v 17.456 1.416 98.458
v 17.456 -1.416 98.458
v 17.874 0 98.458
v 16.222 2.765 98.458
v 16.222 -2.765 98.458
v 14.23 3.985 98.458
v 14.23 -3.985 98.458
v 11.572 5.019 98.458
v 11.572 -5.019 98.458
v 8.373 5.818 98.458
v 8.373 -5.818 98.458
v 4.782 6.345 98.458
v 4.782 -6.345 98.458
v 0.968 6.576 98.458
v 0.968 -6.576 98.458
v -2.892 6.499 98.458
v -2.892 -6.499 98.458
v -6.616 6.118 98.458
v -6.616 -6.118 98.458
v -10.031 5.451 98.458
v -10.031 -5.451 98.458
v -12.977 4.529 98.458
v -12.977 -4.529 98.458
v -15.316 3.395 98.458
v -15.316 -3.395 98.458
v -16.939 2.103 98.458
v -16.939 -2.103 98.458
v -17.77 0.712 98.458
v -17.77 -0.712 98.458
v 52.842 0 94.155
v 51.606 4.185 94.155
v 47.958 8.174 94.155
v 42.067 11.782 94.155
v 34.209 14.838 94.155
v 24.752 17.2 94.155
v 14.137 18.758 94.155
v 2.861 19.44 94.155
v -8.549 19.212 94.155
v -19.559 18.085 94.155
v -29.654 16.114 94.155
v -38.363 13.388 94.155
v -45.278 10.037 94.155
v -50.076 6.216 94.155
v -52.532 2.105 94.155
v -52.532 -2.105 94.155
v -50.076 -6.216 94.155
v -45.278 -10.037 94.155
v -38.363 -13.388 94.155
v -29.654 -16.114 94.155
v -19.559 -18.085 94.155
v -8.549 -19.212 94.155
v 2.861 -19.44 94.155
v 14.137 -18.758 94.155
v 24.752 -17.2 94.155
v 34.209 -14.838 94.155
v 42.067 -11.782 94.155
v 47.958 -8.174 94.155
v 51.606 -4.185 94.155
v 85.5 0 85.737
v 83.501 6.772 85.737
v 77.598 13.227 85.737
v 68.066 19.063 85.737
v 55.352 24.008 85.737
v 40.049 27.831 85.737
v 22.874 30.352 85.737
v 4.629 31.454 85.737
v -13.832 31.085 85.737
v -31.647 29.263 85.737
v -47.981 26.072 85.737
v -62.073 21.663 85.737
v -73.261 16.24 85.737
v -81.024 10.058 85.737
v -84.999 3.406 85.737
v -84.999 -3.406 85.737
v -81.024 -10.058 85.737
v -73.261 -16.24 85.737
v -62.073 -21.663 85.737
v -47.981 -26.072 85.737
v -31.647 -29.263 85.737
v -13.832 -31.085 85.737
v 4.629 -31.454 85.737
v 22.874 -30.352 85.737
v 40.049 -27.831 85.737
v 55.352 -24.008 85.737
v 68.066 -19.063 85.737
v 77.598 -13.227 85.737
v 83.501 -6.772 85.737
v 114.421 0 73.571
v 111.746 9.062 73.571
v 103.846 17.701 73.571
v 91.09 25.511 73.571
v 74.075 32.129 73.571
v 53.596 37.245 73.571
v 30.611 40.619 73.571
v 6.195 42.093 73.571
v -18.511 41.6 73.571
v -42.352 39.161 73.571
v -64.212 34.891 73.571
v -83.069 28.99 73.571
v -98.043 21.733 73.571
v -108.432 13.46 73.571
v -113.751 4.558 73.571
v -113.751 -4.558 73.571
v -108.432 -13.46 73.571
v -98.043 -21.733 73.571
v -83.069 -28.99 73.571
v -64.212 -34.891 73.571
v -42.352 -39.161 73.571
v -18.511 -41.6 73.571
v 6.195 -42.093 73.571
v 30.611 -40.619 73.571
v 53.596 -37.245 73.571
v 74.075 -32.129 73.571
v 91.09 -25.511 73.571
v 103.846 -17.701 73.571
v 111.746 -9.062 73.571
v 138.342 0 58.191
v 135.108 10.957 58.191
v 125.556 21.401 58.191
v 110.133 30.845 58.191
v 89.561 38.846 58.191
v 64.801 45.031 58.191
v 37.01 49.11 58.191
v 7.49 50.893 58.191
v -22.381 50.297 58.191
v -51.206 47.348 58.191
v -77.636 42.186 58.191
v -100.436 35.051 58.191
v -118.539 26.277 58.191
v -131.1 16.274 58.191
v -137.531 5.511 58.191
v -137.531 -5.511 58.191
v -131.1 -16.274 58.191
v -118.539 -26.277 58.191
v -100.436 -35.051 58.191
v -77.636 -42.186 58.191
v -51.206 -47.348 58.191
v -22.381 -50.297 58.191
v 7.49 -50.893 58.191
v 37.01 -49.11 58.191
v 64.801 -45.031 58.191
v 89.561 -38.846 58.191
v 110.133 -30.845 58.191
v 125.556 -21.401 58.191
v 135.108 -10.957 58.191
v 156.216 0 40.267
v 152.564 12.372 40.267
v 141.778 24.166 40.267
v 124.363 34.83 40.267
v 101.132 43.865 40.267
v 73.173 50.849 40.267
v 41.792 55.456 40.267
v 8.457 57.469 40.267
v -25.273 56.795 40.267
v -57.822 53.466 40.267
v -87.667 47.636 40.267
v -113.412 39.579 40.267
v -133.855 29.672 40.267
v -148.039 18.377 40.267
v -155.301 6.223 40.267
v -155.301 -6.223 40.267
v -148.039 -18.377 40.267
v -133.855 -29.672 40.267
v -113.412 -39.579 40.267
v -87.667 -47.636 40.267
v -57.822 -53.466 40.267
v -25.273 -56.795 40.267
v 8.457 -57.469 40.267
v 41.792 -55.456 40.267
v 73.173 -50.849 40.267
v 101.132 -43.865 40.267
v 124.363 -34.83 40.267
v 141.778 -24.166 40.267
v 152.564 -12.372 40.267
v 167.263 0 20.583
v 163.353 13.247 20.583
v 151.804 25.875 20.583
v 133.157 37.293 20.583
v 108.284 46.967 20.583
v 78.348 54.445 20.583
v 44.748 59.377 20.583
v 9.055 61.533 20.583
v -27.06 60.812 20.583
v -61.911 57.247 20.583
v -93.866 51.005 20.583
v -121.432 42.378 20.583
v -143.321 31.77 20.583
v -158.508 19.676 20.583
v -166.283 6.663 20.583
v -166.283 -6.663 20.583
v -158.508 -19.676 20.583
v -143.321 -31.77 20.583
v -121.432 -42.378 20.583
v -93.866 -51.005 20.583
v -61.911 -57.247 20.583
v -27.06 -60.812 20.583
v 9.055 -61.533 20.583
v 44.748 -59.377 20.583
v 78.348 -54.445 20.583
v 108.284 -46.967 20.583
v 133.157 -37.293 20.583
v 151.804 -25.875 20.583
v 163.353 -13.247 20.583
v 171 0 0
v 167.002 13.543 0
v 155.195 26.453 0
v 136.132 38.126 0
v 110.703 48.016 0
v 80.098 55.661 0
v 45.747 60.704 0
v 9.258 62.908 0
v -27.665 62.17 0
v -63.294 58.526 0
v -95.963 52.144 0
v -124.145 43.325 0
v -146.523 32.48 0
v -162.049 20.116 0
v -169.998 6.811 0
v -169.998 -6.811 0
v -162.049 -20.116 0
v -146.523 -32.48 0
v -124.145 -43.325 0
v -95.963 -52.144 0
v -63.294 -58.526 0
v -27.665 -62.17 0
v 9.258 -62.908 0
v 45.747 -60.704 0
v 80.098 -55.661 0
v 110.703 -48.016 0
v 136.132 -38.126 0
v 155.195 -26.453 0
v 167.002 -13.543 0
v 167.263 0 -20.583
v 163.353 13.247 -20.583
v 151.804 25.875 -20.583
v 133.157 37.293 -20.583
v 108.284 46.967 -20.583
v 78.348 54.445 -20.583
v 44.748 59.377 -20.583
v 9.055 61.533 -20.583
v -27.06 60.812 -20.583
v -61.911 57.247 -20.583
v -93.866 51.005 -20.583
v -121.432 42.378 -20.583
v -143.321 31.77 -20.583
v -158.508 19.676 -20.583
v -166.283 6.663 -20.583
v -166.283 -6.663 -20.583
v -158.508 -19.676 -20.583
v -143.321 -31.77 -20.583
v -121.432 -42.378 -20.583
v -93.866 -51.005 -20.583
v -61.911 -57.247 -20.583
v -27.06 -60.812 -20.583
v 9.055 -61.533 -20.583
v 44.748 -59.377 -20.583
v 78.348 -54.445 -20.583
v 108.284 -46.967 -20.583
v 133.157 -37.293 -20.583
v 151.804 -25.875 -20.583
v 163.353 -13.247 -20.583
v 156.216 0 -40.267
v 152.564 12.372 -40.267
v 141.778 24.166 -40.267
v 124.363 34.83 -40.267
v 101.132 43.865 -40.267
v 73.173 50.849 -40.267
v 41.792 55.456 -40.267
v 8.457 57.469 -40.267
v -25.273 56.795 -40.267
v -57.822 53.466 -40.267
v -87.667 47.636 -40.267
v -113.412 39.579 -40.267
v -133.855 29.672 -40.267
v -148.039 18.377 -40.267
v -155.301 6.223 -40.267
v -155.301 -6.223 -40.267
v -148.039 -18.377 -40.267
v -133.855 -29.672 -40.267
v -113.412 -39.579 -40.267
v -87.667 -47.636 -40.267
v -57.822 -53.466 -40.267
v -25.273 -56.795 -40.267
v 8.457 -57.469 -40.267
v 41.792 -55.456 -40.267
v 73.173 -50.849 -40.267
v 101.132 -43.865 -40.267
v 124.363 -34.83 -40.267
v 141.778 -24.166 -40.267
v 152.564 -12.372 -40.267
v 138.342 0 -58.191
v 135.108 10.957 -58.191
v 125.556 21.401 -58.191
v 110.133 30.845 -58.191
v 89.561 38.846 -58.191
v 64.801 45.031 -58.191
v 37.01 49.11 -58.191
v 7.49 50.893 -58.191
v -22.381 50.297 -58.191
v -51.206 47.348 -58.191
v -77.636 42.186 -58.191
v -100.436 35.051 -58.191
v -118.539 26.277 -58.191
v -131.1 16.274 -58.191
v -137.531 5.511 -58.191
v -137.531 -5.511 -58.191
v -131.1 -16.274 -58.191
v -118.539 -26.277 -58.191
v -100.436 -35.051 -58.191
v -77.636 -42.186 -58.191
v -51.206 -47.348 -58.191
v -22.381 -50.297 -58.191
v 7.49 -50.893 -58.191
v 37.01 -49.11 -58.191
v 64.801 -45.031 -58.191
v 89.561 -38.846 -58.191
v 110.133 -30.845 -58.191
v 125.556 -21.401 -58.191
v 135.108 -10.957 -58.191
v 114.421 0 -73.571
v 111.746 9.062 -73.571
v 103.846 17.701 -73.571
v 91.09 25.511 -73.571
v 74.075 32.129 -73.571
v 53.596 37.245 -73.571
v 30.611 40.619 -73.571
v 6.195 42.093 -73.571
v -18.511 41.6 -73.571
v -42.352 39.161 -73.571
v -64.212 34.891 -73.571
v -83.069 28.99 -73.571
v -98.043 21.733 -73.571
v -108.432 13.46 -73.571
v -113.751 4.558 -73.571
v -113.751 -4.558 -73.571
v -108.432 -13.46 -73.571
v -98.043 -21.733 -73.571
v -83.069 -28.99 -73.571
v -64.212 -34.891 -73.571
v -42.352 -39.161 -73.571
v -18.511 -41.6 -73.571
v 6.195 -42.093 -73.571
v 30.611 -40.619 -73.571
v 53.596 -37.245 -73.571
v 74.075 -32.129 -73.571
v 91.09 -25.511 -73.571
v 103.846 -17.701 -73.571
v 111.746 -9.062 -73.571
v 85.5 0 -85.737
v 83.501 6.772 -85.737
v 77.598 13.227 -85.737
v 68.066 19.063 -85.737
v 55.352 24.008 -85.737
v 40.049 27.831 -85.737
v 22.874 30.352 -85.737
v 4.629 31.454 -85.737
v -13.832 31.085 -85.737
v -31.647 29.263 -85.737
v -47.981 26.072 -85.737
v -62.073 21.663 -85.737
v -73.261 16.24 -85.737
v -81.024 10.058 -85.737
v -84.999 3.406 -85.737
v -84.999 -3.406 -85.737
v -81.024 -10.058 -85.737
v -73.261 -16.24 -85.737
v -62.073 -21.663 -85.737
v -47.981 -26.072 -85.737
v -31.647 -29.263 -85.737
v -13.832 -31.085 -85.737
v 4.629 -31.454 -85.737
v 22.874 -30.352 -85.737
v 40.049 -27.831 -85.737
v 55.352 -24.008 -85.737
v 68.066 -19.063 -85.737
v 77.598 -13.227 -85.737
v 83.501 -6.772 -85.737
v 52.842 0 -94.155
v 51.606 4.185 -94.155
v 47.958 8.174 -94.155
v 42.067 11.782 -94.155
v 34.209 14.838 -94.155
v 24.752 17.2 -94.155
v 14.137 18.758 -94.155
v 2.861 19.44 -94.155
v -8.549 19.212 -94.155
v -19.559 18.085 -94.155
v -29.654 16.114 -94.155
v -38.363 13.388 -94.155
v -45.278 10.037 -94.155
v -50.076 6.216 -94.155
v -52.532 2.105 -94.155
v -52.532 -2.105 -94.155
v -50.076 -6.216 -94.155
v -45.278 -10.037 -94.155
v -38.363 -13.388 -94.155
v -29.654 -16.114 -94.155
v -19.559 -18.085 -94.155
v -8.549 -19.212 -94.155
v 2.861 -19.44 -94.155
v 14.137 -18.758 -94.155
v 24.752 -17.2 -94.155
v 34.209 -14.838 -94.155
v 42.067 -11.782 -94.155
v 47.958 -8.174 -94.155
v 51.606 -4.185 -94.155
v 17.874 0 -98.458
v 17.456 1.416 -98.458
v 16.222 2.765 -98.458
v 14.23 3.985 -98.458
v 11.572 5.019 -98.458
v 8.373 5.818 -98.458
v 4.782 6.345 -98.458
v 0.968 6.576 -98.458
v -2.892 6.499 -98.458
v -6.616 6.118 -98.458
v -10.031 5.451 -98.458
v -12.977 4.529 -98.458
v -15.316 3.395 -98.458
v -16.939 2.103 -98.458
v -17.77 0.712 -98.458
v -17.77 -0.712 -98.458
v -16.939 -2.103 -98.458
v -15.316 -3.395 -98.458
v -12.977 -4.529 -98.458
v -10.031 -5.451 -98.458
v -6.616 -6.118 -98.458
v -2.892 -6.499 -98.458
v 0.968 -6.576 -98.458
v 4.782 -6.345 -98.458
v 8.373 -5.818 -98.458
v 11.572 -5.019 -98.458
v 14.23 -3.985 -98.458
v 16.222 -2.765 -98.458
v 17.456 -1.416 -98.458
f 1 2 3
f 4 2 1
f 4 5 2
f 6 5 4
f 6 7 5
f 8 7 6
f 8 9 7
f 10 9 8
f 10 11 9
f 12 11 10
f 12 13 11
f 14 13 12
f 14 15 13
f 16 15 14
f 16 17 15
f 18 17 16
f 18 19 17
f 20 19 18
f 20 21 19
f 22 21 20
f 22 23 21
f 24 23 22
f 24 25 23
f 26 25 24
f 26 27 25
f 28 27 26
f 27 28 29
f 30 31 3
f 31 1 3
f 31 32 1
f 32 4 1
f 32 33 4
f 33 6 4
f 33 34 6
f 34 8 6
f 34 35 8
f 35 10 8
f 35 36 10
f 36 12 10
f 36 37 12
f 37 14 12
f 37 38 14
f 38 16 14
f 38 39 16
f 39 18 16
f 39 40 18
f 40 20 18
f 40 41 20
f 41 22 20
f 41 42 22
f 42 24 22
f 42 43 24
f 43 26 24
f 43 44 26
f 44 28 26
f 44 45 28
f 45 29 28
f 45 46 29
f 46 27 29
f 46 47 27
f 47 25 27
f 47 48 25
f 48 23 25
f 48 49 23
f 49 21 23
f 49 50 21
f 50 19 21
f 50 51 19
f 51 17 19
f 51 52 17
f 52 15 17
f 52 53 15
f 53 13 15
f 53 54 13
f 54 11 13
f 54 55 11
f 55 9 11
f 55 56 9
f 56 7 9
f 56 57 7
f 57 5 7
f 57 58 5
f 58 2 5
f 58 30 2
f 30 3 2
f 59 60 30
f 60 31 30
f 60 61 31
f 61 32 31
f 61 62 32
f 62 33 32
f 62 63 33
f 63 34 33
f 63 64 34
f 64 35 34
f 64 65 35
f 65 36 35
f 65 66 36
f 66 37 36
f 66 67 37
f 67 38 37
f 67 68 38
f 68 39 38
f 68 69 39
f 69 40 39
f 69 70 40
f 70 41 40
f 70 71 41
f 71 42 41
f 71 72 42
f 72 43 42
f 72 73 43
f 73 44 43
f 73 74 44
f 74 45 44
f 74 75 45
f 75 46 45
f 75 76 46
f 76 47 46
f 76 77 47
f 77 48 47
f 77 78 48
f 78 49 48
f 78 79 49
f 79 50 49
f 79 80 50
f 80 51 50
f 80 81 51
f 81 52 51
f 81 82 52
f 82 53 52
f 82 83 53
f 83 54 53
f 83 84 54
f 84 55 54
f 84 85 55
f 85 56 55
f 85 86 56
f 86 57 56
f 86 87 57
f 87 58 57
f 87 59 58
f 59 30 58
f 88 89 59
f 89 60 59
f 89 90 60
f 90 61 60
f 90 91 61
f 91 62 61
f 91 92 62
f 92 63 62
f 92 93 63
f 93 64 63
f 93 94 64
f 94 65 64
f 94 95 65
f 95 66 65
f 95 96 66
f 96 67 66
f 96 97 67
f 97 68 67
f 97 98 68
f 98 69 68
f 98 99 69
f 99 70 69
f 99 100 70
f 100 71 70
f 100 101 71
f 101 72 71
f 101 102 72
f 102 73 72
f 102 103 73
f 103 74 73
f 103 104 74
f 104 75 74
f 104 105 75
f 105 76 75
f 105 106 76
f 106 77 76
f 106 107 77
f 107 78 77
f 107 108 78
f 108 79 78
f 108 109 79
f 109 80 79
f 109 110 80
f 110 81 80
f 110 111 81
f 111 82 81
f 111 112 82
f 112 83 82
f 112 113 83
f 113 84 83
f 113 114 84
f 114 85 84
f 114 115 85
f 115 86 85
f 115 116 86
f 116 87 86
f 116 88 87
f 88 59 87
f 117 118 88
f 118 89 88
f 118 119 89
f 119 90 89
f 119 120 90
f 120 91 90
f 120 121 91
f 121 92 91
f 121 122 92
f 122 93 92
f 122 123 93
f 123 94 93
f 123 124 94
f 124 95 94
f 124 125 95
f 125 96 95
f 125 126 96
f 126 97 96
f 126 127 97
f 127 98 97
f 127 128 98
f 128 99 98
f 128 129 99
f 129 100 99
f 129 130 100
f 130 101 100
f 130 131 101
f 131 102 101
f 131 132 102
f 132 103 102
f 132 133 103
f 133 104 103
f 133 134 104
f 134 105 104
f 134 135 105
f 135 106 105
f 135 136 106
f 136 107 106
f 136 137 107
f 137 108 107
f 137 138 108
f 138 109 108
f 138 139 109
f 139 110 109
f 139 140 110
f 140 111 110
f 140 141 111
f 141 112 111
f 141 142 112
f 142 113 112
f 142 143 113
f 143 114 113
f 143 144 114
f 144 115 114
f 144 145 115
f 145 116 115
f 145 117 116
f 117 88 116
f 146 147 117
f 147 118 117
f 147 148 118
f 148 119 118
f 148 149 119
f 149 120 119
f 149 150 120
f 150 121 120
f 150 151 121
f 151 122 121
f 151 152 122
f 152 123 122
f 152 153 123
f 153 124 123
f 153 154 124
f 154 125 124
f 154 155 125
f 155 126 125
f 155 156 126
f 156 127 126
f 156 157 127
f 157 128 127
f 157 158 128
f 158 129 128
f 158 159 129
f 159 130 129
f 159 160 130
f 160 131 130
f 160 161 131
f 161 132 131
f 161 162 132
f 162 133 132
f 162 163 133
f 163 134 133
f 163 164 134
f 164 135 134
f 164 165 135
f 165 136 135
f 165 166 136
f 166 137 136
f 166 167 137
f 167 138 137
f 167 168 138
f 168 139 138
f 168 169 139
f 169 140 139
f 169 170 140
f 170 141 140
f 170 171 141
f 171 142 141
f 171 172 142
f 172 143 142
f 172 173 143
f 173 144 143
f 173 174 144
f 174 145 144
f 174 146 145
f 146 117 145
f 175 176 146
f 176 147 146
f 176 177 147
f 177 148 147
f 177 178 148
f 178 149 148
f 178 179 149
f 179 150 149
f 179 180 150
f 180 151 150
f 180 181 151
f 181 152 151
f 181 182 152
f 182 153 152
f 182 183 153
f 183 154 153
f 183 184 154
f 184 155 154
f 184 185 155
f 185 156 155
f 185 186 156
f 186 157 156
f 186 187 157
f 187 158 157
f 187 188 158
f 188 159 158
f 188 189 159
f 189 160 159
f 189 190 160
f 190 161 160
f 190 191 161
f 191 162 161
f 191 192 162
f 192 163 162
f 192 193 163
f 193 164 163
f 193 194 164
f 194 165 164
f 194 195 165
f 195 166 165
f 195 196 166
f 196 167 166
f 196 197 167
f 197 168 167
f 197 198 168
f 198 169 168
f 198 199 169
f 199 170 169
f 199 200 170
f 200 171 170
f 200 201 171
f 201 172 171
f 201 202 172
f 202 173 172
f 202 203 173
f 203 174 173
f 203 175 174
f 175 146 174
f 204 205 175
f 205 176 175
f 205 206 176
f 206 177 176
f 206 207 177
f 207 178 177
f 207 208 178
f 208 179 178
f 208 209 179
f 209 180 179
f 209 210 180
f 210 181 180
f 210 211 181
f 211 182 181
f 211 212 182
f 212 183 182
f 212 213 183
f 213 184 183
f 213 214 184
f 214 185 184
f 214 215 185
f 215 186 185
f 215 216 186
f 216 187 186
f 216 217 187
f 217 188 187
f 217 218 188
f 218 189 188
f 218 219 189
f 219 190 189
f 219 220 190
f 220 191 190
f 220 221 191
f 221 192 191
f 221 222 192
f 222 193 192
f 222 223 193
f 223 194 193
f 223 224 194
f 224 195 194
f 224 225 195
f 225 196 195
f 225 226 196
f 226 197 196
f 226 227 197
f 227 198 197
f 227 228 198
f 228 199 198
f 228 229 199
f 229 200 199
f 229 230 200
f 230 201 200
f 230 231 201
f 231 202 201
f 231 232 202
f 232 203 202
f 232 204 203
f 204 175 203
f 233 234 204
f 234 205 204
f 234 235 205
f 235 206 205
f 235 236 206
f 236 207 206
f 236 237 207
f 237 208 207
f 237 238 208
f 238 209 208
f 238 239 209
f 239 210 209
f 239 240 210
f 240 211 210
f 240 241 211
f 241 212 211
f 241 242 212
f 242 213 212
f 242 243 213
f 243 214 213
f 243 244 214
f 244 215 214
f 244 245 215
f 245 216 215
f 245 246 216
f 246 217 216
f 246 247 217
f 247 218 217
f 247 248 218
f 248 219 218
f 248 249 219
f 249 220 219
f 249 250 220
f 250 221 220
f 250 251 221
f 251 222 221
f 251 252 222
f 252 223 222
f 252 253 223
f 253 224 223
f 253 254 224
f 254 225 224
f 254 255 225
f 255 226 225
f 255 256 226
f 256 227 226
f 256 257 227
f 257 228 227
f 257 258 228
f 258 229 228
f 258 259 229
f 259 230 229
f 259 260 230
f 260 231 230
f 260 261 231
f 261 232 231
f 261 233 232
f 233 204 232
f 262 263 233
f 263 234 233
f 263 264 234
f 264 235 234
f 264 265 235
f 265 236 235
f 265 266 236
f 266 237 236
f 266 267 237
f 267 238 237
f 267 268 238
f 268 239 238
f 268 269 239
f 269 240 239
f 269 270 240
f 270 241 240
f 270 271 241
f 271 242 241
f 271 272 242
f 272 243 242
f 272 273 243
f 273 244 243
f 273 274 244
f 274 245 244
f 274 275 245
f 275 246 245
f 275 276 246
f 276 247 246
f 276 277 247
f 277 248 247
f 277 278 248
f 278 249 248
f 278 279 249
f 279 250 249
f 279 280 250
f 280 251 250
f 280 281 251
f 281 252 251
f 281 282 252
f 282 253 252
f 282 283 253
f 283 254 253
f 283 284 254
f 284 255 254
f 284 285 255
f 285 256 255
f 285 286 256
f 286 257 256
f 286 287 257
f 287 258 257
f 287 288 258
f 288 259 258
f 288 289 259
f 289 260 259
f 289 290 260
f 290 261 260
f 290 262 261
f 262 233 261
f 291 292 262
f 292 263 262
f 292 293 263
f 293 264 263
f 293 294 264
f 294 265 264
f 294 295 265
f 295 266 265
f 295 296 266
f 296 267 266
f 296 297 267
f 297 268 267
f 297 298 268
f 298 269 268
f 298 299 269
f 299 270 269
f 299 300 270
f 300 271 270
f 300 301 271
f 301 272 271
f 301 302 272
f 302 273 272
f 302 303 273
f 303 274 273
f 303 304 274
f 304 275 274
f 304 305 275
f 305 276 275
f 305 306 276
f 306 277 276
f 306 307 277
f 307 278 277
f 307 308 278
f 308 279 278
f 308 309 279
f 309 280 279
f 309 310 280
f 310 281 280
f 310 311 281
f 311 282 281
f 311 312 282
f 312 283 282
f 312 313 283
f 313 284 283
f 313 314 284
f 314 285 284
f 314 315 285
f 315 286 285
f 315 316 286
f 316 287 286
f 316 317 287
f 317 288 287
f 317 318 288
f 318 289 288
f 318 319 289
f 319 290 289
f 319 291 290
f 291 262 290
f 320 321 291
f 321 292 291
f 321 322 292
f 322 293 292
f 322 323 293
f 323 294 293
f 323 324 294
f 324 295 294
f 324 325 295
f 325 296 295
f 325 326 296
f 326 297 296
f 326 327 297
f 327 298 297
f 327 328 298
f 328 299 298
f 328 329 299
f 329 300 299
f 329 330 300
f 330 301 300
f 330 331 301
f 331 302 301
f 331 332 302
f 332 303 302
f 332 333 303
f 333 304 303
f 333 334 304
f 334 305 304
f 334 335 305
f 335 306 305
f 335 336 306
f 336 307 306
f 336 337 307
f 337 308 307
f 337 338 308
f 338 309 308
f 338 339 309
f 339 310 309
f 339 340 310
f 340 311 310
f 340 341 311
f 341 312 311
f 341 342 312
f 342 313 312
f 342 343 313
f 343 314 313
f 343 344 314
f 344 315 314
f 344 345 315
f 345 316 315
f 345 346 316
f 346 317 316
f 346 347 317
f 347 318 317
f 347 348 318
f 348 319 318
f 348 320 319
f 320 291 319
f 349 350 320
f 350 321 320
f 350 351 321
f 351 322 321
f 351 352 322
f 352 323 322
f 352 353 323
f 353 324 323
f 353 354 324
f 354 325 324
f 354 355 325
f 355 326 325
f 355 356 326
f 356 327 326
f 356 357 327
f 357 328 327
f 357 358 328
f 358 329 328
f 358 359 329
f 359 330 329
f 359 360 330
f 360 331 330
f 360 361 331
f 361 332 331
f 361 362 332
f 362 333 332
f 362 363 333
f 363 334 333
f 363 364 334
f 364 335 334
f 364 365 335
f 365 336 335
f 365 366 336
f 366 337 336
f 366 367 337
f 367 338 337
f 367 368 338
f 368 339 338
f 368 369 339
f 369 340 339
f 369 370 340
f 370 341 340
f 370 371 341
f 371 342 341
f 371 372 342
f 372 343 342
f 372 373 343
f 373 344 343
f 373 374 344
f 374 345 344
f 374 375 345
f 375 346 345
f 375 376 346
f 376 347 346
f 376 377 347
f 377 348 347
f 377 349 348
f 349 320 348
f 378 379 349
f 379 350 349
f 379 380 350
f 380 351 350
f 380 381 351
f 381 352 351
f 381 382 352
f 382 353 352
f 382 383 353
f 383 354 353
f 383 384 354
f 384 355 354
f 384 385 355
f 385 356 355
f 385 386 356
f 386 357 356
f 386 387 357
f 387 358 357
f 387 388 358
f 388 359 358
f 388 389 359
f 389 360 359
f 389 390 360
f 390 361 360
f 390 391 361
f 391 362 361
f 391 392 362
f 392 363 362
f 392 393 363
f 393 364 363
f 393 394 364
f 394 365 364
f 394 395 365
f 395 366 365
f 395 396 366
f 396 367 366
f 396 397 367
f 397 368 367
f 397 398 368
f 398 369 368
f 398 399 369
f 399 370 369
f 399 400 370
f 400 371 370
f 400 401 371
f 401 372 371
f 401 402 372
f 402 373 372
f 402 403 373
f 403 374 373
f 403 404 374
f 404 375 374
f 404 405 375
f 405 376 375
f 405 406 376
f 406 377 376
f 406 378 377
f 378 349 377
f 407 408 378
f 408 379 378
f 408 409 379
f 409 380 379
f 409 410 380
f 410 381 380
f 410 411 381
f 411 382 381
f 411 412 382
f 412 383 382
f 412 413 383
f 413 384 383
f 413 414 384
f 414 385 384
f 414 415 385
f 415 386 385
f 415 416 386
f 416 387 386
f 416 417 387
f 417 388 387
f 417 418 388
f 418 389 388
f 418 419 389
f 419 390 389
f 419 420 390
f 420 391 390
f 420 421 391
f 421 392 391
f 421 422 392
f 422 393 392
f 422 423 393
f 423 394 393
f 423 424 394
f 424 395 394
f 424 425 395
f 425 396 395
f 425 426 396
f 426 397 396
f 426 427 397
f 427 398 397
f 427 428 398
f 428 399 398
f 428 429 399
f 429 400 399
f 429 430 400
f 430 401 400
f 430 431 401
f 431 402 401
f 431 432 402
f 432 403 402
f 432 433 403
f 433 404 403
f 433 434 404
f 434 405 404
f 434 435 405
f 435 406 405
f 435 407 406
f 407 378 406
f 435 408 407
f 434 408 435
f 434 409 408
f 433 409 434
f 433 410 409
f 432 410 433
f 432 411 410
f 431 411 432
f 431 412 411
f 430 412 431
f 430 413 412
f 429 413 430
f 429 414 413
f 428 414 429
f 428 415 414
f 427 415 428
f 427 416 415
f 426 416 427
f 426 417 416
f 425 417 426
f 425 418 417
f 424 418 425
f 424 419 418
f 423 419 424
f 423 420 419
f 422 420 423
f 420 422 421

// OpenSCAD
// Generated by SolidPython 1.0.1 on 2020-07-29 00:46:53


scale(v = [19, 7, 11]) {
	sphere(r = 9);
}
/***********************************************
*********      SolidPython code:      **********
************************************************
 
# import packages: SolidPython
from solid import *
from solid.utils import *
from itertools import chain, combinations, permutations


class Resize:

    def __init__(self, scad_file):
        self.scad_file = scad_file
        #self.scad_file = import_scad(scad_file)
        # cone/cylinder param:
        self.r1 = 0
        self.r2 = 0
        self.h = 0
        # rectangular prism param:
        self.w = 0
        self.l = 0
        # ellipse param:
        self.r = 0

    # import OpenScad code (file name corresponds to shape)


    # classify shape + parameters
    def assign(self, param1, param2, param3):
        if self.scad_file == 'cone.scad':
            self.r1 = param1
            self.r2 = param2
            self.h = param3
        elif self.scad_file == 'cylinder.scad':
            self.r1 = param1
            self.r2 = param2
            self.h = param3
        elif self.scad_file == 'rectangularPrism.scad':
            self.h = param1
            self.l = param2
            self.w = param3
        else:
            self.r = param1
            self.h = param2

    # resize parameters
    def iterate(self):
        x = range(3, 20, 2)
        i = 1
        if self.scad_file == 'cone.scad':
            tempList = list(permutations(x, 2))
            for temp in tempList:
                param1 = temp[0]
                param2 = temp[1]
                filepath = 'produced_scad_files/' + 'cone' + str(param1) + '_' + str(param2) + '_' + '.scad'
                scad_render_to_file(cylinder(h=param1, r1=param2, r2=0), filepath)

        elif self.scad_file == 'cylinder.scad':
            tempList = list(permutations(x, 3))
            for temp in tempList:
                param1 = temp[0]
                param2 = temp[1]
                filepath = 'produced_scad_files/' + 'cylinder' + str(param1) + '_' + str(param2) + '_' + '.scad'
                scad_render_to_file(cylinder(h=param1, r1=param2, r2=param2), filepath)

        elif self.scad_file == 'rectangularPrism.scad':
            tempList = list(permutations(x, 3))
            for temp in tempList:
                param1 = temp[0]
                param2 = temp[1]
                param3 = temp[2]
                filepath = 'produced_scad_files/' + 'rectangularPrism' + str(param1) + '_' + str(param2) + '_' + str(
                    param3) + '.scad'
                scad_render_to_file(cube(size=(param1, param2, param3)), filepath)

        elif self.scad_file == 'ellipse.scad':
            tempList = list(permutations(x, 4))
            for temp in tempList:
                param1 = temp[0]
                param2 = temp[1]
                param3 = temp[2]
                param4 = temp[3]
                filepath = 'produced_scad_files/' + 'ellipse' + str(param1) + '_' + str(param2) + '_' + str(param3) + '_' + str(param4) + '.scad'
                scad_render_to_file(scale([param1, param2, param3])(sphere(r=param4)), filepath)

    def render_to_scadfile(self):
        scad_render_to_file(scad, 'example.scad') 
 
************************************************/
